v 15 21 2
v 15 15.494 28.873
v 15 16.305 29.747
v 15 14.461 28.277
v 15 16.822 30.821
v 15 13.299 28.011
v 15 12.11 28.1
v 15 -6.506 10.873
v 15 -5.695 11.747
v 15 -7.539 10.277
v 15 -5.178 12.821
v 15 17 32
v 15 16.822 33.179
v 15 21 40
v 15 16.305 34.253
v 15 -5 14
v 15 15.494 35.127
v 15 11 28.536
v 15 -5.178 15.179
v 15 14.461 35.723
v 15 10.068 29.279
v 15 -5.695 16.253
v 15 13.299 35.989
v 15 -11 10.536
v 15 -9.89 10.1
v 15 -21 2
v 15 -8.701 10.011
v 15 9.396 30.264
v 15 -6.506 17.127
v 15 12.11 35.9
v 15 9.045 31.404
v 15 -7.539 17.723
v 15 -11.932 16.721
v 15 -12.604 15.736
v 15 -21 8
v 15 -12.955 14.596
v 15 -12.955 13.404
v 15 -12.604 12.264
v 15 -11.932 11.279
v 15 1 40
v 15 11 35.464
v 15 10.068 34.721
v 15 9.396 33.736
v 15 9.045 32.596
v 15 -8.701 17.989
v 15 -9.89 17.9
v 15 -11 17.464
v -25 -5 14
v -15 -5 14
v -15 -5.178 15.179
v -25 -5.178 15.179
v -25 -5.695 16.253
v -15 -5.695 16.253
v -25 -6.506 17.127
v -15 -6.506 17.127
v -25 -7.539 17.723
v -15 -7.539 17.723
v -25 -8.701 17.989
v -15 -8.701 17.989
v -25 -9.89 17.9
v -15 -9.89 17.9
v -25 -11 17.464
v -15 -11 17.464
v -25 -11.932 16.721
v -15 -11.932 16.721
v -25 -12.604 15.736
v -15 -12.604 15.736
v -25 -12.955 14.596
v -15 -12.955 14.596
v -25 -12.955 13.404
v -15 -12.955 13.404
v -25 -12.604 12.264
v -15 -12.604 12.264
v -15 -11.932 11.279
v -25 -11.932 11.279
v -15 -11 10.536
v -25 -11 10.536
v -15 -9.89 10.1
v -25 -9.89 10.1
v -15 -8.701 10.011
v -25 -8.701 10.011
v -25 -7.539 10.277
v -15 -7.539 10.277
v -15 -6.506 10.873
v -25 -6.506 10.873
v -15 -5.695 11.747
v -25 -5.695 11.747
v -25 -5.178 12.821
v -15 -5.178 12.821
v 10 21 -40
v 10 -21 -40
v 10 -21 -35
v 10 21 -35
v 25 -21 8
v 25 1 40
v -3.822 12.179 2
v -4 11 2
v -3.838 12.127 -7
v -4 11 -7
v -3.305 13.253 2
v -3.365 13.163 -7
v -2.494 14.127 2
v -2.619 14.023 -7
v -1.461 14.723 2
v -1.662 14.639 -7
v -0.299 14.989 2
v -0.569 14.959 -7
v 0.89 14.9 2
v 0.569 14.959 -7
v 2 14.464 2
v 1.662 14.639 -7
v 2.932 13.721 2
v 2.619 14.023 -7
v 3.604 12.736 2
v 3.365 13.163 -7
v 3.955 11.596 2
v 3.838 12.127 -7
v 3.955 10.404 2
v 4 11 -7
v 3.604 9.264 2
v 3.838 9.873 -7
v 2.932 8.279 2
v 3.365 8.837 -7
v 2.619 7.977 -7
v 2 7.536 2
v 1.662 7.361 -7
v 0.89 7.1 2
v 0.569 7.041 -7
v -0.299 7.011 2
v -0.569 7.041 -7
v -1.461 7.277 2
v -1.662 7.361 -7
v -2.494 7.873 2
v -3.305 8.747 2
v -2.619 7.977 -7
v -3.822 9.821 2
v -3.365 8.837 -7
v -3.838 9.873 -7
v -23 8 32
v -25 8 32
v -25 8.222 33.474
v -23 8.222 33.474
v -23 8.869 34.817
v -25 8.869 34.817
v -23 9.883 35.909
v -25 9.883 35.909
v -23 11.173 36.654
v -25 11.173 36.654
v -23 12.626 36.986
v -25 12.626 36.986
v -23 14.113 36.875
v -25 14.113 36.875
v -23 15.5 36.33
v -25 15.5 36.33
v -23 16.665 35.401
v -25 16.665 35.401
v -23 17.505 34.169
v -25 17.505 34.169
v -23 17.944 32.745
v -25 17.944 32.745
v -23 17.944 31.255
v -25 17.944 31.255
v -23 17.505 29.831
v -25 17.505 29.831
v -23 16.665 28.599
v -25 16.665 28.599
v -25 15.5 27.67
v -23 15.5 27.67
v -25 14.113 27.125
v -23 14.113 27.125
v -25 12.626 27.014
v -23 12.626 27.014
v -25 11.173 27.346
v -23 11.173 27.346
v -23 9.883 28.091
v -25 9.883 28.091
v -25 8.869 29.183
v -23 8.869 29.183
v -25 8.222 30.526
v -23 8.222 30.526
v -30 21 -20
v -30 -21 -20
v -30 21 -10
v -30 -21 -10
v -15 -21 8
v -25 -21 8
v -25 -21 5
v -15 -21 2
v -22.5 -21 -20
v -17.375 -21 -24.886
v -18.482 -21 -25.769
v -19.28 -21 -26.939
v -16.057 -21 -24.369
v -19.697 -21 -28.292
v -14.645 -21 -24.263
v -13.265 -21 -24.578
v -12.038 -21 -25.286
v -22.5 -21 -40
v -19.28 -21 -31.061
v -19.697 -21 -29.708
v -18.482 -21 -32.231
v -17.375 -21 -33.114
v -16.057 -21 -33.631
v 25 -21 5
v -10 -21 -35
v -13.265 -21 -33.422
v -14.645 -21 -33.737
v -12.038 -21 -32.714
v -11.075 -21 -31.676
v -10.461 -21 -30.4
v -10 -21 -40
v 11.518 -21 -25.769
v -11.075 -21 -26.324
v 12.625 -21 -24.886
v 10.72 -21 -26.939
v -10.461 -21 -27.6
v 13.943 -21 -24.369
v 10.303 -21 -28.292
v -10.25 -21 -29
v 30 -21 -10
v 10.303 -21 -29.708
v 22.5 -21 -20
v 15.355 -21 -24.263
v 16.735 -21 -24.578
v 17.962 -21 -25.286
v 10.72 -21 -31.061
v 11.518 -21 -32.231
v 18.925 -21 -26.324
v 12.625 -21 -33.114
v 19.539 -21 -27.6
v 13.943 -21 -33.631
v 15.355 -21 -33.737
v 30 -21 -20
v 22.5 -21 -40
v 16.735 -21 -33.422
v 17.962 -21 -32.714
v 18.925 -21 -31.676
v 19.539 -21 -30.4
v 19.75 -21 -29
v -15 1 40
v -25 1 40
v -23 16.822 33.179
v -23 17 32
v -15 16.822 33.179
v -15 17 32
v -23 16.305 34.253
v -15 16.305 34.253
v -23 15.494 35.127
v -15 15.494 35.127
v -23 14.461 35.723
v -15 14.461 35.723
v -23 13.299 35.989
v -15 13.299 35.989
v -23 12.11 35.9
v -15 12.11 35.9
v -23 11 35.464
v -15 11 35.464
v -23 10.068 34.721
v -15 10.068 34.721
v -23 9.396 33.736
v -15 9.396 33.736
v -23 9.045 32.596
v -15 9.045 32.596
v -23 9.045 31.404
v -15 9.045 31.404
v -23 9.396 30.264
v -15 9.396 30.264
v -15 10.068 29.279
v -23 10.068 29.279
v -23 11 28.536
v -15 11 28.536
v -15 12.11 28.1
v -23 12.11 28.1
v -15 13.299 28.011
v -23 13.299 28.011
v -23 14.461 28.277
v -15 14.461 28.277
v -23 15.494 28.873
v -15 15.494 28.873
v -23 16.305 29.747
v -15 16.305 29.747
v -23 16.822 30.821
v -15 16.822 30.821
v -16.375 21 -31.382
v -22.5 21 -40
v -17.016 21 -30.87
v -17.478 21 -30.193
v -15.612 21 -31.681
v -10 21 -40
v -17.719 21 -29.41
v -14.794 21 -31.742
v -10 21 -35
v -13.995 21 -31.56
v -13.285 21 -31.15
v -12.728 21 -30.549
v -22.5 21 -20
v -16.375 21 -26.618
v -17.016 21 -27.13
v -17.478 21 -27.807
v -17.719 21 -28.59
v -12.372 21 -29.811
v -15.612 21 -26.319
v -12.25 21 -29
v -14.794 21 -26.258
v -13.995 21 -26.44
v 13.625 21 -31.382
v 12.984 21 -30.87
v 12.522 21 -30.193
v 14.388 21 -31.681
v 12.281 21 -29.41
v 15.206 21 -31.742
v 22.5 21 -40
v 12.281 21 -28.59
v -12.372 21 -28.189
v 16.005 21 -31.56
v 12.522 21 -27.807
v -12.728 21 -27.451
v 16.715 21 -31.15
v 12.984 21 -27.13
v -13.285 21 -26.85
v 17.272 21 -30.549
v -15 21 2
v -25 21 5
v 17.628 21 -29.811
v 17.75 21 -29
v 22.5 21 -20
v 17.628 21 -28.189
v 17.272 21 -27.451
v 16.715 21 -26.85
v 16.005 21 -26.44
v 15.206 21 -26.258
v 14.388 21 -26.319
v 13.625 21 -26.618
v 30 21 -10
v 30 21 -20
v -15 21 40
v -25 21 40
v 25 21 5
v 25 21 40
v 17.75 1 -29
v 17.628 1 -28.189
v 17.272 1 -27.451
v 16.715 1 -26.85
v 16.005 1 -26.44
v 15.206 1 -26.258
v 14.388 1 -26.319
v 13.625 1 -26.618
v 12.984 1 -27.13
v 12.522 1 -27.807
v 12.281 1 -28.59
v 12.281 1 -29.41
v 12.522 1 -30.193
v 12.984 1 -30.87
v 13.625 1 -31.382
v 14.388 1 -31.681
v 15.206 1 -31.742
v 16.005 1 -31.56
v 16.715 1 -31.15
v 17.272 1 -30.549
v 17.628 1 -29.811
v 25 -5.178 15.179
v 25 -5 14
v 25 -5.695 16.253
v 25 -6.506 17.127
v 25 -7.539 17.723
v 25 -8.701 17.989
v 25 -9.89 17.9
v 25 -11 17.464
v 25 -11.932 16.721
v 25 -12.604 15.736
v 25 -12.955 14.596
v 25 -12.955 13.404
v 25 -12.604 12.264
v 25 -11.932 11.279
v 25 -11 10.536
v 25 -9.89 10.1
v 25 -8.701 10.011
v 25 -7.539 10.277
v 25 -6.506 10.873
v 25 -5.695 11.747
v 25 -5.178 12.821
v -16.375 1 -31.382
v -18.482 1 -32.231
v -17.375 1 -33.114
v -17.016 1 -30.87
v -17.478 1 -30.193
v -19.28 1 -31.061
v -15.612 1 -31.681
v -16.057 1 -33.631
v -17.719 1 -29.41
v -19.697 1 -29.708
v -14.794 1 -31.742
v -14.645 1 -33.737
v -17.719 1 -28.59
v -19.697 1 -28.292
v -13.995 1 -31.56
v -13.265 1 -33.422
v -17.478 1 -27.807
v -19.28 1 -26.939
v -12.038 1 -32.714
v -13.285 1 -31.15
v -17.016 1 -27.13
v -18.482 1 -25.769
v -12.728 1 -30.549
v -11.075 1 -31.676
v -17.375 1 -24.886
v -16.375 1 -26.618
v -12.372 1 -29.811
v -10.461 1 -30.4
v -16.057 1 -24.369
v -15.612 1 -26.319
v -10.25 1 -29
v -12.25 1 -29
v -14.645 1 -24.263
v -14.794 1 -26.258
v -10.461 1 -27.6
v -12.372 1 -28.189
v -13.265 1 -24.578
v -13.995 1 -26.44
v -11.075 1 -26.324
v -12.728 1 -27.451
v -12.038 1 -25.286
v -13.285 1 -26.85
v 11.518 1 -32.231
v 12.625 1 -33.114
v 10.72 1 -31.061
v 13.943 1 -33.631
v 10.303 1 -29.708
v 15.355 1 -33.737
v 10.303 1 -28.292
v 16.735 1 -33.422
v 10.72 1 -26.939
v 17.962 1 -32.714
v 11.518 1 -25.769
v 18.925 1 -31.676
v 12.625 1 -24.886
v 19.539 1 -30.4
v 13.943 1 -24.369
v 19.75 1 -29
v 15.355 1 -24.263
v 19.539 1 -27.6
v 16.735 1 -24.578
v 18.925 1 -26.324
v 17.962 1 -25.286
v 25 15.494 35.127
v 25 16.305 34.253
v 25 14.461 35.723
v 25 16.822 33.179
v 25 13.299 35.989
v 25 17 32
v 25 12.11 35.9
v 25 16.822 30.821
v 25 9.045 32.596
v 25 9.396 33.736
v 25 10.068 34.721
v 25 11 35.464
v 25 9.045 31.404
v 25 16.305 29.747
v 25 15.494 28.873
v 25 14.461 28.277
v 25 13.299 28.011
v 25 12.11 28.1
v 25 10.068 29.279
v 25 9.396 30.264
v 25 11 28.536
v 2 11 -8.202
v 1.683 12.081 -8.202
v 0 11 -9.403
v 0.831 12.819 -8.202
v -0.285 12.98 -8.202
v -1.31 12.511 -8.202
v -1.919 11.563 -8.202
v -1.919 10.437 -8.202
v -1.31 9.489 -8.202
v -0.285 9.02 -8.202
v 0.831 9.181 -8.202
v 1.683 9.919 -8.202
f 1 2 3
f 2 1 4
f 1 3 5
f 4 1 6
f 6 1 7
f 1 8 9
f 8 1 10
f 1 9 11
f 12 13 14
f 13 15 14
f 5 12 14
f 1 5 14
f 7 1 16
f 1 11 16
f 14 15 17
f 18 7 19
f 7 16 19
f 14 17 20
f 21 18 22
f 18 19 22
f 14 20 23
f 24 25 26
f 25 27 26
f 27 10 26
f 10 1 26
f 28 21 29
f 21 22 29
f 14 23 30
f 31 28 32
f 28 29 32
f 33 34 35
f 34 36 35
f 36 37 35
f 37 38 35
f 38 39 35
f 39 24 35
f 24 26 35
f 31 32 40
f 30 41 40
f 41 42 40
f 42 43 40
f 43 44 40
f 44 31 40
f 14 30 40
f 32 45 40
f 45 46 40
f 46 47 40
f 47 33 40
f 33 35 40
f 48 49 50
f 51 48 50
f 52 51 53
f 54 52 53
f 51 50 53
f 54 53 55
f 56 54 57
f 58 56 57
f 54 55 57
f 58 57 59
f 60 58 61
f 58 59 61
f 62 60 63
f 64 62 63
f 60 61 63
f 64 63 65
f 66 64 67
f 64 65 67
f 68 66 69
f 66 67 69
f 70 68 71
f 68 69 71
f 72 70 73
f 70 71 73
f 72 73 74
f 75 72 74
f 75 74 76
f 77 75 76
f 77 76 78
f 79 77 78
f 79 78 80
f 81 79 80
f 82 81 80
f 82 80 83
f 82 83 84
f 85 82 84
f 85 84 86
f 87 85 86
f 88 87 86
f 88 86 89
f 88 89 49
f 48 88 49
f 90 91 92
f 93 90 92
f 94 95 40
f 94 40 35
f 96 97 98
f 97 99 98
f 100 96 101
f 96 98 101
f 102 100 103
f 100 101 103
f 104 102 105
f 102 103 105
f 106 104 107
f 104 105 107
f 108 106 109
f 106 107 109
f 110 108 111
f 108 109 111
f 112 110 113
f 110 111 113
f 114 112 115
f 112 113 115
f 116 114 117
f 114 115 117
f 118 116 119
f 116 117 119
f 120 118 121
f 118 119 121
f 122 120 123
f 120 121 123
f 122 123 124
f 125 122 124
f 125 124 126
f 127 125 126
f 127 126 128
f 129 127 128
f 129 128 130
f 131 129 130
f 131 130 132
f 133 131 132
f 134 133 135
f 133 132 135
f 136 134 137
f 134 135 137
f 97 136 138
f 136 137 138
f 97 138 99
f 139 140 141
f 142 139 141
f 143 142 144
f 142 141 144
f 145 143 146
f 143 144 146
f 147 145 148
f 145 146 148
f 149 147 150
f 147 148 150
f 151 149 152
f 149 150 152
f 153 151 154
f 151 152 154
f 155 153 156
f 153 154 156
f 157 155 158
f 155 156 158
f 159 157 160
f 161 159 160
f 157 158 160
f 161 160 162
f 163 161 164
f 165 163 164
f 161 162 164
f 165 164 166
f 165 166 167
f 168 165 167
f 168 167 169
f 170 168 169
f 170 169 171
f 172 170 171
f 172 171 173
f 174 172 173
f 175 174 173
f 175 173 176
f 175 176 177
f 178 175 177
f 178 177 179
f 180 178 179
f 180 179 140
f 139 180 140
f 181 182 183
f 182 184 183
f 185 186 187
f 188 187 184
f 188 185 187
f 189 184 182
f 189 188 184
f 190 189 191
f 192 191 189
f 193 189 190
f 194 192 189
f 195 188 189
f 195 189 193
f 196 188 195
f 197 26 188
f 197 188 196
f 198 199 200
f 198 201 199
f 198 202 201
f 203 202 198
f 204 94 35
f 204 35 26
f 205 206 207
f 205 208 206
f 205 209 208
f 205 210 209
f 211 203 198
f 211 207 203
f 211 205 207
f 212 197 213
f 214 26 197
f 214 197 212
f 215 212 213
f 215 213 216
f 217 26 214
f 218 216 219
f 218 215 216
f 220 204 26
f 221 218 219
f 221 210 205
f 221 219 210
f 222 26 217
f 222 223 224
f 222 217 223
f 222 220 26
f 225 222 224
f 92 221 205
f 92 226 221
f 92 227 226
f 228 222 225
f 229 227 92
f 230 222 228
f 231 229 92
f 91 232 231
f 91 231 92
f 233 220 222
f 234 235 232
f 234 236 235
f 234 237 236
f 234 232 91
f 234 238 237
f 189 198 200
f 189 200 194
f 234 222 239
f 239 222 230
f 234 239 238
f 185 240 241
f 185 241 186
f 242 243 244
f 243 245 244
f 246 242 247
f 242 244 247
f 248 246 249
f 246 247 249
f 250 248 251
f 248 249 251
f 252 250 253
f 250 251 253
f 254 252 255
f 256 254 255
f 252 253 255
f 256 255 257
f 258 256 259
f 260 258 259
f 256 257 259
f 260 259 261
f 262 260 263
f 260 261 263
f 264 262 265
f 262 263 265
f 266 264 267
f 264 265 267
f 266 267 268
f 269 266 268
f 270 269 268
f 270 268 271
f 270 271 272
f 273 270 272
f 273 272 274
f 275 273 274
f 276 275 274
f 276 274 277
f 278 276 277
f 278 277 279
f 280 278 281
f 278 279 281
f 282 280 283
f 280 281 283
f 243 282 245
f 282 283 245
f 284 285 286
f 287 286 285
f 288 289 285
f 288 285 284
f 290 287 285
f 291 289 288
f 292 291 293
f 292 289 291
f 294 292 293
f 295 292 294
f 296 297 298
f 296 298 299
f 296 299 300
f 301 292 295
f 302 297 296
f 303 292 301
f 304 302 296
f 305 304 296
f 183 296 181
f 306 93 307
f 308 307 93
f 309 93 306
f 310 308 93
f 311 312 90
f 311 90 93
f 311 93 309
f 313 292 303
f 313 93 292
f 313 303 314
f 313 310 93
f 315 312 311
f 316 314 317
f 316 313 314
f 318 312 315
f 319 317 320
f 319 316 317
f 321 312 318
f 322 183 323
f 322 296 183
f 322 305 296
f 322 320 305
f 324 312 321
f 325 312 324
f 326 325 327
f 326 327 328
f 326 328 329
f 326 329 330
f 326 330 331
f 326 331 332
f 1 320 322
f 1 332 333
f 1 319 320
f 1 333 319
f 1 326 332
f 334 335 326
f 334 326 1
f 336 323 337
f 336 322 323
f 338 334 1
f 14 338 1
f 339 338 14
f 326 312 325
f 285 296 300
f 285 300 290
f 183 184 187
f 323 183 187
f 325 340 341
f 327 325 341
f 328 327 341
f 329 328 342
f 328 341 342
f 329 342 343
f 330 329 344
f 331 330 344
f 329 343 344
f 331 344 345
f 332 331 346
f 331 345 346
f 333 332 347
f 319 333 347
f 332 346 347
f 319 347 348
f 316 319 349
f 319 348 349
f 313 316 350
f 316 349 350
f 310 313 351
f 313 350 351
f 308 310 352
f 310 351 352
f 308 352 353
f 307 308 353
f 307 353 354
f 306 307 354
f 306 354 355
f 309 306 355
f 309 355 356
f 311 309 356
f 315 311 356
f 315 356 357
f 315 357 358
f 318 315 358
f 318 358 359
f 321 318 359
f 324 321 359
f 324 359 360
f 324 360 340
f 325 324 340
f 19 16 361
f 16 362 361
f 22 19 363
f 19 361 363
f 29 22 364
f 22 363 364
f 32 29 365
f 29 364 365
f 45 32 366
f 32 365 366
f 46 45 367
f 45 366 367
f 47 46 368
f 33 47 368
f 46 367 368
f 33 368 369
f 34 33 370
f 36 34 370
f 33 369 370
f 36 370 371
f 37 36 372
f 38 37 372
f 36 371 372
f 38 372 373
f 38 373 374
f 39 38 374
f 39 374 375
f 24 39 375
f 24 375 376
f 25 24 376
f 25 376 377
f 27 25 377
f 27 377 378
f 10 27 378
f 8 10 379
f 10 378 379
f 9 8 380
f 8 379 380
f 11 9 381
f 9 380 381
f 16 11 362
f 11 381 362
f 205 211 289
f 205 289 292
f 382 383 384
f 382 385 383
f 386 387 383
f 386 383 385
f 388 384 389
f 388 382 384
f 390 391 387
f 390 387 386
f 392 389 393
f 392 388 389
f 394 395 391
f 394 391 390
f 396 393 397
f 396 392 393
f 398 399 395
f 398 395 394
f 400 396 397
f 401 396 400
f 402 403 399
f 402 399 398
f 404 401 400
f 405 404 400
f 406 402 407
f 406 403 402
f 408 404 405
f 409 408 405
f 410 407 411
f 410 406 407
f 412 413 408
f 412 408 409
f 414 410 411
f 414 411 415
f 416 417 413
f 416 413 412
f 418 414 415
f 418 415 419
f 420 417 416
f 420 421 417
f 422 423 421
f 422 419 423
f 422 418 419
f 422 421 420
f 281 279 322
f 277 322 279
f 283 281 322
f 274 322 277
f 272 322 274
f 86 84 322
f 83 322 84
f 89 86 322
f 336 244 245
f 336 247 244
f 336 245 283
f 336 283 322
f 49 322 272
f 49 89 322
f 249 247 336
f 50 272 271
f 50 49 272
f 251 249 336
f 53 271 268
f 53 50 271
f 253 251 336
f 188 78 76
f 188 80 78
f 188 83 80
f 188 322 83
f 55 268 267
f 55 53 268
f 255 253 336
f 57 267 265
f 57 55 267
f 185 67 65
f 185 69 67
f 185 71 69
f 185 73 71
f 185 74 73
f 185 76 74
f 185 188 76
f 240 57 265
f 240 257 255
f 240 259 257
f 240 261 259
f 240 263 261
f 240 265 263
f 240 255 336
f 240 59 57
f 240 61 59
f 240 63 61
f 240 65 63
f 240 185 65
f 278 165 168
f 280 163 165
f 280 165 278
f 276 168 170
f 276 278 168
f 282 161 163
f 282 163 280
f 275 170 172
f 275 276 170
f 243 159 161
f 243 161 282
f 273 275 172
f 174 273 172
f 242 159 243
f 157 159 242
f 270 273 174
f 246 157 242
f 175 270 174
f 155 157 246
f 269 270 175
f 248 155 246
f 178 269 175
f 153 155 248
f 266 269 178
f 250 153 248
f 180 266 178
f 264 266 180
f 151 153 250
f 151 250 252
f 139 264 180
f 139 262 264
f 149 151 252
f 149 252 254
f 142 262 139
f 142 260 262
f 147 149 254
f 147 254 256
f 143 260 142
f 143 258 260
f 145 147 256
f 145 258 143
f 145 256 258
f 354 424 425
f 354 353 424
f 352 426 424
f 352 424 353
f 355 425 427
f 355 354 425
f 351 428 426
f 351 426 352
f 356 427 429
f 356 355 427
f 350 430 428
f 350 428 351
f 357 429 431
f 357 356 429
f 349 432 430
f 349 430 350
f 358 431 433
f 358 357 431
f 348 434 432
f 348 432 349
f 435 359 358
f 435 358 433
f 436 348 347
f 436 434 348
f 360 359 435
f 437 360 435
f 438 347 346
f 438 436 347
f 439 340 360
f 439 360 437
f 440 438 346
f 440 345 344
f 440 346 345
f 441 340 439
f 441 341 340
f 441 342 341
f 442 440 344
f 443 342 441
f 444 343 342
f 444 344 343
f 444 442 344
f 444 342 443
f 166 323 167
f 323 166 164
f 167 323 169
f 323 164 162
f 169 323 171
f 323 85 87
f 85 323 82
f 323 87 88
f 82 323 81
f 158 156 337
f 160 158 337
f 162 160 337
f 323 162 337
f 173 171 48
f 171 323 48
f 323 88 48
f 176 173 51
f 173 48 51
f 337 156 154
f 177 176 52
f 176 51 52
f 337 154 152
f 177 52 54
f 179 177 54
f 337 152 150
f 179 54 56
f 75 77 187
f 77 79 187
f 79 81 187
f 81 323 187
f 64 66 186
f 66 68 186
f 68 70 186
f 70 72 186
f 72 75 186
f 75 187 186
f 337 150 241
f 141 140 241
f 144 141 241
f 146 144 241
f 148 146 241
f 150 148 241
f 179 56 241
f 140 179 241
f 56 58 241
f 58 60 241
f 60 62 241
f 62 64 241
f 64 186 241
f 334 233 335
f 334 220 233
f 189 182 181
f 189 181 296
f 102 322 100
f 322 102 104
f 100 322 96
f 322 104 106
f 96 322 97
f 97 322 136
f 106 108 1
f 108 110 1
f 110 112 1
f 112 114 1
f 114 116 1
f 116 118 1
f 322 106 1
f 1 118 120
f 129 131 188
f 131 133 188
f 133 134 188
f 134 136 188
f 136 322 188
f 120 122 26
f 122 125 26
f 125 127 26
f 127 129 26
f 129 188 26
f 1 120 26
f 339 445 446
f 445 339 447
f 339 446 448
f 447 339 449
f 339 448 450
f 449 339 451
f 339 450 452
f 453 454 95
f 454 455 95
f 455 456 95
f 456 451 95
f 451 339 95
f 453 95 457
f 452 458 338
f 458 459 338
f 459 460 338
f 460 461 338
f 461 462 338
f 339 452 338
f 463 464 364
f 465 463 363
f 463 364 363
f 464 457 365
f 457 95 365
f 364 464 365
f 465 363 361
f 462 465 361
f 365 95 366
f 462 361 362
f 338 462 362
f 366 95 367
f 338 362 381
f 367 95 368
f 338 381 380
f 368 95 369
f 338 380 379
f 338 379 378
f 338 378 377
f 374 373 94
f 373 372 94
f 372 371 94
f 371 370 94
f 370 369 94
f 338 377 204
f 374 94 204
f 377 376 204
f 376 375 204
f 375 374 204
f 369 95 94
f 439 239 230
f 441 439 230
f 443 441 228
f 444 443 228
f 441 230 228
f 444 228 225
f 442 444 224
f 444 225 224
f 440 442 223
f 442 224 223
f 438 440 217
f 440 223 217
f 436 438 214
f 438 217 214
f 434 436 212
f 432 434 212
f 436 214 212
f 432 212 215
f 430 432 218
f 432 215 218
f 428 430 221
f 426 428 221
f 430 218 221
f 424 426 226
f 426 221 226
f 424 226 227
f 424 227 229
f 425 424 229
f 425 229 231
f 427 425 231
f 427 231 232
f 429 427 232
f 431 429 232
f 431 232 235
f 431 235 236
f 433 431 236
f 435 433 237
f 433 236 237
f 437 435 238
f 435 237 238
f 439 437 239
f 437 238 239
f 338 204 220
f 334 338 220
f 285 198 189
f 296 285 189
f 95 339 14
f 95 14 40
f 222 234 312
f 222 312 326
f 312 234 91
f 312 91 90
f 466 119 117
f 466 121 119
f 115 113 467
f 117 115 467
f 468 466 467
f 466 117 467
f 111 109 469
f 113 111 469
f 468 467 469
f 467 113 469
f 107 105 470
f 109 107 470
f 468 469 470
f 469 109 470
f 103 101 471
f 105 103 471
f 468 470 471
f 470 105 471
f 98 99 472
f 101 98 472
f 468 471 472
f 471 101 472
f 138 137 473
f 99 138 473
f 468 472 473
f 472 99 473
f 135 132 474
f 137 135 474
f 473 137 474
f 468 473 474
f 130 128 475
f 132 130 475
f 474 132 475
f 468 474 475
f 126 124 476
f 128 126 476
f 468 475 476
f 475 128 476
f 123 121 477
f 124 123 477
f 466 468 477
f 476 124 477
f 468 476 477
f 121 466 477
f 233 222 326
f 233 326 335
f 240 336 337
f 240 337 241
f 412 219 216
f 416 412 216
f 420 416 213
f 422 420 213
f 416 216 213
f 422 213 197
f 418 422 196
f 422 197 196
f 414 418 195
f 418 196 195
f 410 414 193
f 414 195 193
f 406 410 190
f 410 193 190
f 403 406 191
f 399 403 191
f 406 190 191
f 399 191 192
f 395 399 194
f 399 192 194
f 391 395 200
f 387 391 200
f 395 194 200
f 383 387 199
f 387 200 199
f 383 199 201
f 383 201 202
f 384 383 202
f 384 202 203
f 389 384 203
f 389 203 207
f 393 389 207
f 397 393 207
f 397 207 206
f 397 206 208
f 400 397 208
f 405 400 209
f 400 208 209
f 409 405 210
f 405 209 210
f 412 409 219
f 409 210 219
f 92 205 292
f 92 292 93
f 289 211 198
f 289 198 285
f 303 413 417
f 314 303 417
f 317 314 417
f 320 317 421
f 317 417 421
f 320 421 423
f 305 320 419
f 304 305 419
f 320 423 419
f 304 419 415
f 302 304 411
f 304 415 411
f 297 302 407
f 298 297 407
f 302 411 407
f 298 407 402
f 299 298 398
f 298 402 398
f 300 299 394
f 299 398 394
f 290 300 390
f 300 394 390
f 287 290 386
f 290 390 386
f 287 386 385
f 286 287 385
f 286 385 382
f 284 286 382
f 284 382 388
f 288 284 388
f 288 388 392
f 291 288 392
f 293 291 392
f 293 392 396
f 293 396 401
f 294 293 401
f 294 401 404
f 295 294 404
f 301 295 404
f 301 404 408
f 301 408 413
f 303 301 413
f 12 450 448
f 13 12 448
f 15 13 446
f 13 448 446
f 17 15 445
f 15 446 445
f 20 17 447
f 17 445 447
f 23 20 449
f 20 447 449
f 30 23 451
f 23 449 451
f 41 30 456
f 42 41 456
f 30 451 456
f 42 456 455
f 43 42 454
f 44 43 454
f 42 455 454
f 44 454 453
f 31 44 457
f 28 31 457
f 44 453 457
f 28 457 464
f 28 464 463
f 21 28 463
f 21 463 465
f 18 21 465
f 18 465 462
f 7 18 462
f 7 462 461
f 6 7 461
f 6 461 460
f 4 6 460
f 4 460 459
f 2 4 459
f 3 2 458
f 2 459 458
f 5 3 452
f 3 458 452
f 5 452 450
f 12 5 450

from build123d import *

# Parameters (mm, degrees)
F1_DEPTH        = 30
F2_W            = 30
F2_H            = 38
F2_W_2          = 7.5
F2_H_2          = 20
F2_W_3          = 20
F2_H_3          = 5
F3_DEPTH        = 42
F4_R            = 4.75
F4_R_2          = 2.75
F5_DEPTH        = 22
F6_DEPTH        = 42
F8_D            = 8
F8_DEPTH        = 9
F8_TIP          = 2.4034424761
F10_D           = 8
F10_DEPTH       = 50
F10_CBORE_D     = 10
F10_CBORE_DEPTH = 2
F10_TIP         = 2.4034424761
F11_D           = 8
F11_DEPTH       = 50
F11_TIP         = 2.4034424761


with BuildPart() as f1:
    # F0 (on Right) → F1 (new body, symmetric)
    with BuildSketch(Plane.YZ):
        Polygon((21, -40), (21, 40), (1, 40), (-21, 8), (-21, -40), align=None)
    extrude(amount=F1_DEPTH, both=True)

    # F2 (on face) → F3 (cut)
    with BuildSketch(Plane.XZ.offset(21)):
        Polygon((30, 8), (30, 40), (25, 40), (25, 5), (30, -10), align=None)
        with Locations((0, 21)):
            Rectangle(F2_W, F2_H)
        with Locations((-26.25, -30)):
            Rectangle(F2_W_2, F2_H_2)
        with Locations((26.25, -30)):
            Rectangle(F2_W_2, F2_H_2)
        Polygon((-30, -10), (-25, 5), (-25, 40), (-30, 40), (-30, 8), align=None)
        with Locations((0, -37.5)):
            Rectangle(F2_W_3, F2_H_3)
    extrude(amount=-F3_DEPTH, mode=Mode.SUBTRACT)

    # F4 (on face) → F5 (cut)
    with BuildSketch(Plane.XZ.offset(21)):
        with Locations((15, -29)):
            Circle(F4_R)
        with Locations((15, -29)):
            Circle(F4_R_2, mode=Mode.SUBTRACT)
        with Locations((-15, -29)):
            Circle(F4_R)
        with Locations((-15, -29)):
            Circle(F4_R_2, mode=Mode.SUBTRACT)
        with Locations((-15, -29)):
            Circle(F4_R_2)
        with Locations((15, -29)):
            Circle(F4_R_2)
    extrude(amount=-F5_DEPTH, mode=Mode.SUBTRACT)

    # F4 (on face) → F6 (cut)
    with BuildSketch(Plane.XZ.offset(21)):
        with Locations((-15, -29)):
            Circle(F4_R_2)
        with Locations((15, -29)):
            Circle(F4_R_2)
    extrude(amount=-F6_DEPTH, mode=Mode.SUBTRACT)

    # F8
    with Locations(Plane.XY.offset(2)):
        with Locations((0, 11)):
            Hole(F8_D / 2, depth=F8_DEPTH)
            with Locations((0, 0, -(F8_DEPTH + F8_TIP / 2))):  # 118° drill point
                Cone(0, F8_D / 2, F8_TIP, mode=Mode.SUBTRACT)

    # F10
    with Locations(Plane(origin=(-25, 0, 0), x_dir=(0, -1, 0), z_dir=(-1, 0, 0))):
        with Locations((-13, 32)):
            CounterBoreHole(F10_D / 2, F10_CBORE_D / 2, F10_CBORE_DEPTH, depth=F10_DEPTH)
            with Locations((0, 0, -(F10_DEPTH + F10_TIP / 2))):  # 118° drill point
                Cone(0, F10_D / 2, F10_TIP, mode=Mode.SUBTRACT)

    # F11
    with Locations(Plane(origin=(-25, 0, 0), x_dir=(0, -1, 0), z_dir=(-1, 0, 0))):
        with Locations((9, 14)):
            Hole(F11_D / 2, depth=F11_DEPTH)
            with Locations((0, 0, -(F11_DEPTH + F11_TIP / 2))):  # 118° drill point
                Cone(0, F11_D / 2, F11_TIP, mode=Mode.SUBTRACT)


solid = f1.part
